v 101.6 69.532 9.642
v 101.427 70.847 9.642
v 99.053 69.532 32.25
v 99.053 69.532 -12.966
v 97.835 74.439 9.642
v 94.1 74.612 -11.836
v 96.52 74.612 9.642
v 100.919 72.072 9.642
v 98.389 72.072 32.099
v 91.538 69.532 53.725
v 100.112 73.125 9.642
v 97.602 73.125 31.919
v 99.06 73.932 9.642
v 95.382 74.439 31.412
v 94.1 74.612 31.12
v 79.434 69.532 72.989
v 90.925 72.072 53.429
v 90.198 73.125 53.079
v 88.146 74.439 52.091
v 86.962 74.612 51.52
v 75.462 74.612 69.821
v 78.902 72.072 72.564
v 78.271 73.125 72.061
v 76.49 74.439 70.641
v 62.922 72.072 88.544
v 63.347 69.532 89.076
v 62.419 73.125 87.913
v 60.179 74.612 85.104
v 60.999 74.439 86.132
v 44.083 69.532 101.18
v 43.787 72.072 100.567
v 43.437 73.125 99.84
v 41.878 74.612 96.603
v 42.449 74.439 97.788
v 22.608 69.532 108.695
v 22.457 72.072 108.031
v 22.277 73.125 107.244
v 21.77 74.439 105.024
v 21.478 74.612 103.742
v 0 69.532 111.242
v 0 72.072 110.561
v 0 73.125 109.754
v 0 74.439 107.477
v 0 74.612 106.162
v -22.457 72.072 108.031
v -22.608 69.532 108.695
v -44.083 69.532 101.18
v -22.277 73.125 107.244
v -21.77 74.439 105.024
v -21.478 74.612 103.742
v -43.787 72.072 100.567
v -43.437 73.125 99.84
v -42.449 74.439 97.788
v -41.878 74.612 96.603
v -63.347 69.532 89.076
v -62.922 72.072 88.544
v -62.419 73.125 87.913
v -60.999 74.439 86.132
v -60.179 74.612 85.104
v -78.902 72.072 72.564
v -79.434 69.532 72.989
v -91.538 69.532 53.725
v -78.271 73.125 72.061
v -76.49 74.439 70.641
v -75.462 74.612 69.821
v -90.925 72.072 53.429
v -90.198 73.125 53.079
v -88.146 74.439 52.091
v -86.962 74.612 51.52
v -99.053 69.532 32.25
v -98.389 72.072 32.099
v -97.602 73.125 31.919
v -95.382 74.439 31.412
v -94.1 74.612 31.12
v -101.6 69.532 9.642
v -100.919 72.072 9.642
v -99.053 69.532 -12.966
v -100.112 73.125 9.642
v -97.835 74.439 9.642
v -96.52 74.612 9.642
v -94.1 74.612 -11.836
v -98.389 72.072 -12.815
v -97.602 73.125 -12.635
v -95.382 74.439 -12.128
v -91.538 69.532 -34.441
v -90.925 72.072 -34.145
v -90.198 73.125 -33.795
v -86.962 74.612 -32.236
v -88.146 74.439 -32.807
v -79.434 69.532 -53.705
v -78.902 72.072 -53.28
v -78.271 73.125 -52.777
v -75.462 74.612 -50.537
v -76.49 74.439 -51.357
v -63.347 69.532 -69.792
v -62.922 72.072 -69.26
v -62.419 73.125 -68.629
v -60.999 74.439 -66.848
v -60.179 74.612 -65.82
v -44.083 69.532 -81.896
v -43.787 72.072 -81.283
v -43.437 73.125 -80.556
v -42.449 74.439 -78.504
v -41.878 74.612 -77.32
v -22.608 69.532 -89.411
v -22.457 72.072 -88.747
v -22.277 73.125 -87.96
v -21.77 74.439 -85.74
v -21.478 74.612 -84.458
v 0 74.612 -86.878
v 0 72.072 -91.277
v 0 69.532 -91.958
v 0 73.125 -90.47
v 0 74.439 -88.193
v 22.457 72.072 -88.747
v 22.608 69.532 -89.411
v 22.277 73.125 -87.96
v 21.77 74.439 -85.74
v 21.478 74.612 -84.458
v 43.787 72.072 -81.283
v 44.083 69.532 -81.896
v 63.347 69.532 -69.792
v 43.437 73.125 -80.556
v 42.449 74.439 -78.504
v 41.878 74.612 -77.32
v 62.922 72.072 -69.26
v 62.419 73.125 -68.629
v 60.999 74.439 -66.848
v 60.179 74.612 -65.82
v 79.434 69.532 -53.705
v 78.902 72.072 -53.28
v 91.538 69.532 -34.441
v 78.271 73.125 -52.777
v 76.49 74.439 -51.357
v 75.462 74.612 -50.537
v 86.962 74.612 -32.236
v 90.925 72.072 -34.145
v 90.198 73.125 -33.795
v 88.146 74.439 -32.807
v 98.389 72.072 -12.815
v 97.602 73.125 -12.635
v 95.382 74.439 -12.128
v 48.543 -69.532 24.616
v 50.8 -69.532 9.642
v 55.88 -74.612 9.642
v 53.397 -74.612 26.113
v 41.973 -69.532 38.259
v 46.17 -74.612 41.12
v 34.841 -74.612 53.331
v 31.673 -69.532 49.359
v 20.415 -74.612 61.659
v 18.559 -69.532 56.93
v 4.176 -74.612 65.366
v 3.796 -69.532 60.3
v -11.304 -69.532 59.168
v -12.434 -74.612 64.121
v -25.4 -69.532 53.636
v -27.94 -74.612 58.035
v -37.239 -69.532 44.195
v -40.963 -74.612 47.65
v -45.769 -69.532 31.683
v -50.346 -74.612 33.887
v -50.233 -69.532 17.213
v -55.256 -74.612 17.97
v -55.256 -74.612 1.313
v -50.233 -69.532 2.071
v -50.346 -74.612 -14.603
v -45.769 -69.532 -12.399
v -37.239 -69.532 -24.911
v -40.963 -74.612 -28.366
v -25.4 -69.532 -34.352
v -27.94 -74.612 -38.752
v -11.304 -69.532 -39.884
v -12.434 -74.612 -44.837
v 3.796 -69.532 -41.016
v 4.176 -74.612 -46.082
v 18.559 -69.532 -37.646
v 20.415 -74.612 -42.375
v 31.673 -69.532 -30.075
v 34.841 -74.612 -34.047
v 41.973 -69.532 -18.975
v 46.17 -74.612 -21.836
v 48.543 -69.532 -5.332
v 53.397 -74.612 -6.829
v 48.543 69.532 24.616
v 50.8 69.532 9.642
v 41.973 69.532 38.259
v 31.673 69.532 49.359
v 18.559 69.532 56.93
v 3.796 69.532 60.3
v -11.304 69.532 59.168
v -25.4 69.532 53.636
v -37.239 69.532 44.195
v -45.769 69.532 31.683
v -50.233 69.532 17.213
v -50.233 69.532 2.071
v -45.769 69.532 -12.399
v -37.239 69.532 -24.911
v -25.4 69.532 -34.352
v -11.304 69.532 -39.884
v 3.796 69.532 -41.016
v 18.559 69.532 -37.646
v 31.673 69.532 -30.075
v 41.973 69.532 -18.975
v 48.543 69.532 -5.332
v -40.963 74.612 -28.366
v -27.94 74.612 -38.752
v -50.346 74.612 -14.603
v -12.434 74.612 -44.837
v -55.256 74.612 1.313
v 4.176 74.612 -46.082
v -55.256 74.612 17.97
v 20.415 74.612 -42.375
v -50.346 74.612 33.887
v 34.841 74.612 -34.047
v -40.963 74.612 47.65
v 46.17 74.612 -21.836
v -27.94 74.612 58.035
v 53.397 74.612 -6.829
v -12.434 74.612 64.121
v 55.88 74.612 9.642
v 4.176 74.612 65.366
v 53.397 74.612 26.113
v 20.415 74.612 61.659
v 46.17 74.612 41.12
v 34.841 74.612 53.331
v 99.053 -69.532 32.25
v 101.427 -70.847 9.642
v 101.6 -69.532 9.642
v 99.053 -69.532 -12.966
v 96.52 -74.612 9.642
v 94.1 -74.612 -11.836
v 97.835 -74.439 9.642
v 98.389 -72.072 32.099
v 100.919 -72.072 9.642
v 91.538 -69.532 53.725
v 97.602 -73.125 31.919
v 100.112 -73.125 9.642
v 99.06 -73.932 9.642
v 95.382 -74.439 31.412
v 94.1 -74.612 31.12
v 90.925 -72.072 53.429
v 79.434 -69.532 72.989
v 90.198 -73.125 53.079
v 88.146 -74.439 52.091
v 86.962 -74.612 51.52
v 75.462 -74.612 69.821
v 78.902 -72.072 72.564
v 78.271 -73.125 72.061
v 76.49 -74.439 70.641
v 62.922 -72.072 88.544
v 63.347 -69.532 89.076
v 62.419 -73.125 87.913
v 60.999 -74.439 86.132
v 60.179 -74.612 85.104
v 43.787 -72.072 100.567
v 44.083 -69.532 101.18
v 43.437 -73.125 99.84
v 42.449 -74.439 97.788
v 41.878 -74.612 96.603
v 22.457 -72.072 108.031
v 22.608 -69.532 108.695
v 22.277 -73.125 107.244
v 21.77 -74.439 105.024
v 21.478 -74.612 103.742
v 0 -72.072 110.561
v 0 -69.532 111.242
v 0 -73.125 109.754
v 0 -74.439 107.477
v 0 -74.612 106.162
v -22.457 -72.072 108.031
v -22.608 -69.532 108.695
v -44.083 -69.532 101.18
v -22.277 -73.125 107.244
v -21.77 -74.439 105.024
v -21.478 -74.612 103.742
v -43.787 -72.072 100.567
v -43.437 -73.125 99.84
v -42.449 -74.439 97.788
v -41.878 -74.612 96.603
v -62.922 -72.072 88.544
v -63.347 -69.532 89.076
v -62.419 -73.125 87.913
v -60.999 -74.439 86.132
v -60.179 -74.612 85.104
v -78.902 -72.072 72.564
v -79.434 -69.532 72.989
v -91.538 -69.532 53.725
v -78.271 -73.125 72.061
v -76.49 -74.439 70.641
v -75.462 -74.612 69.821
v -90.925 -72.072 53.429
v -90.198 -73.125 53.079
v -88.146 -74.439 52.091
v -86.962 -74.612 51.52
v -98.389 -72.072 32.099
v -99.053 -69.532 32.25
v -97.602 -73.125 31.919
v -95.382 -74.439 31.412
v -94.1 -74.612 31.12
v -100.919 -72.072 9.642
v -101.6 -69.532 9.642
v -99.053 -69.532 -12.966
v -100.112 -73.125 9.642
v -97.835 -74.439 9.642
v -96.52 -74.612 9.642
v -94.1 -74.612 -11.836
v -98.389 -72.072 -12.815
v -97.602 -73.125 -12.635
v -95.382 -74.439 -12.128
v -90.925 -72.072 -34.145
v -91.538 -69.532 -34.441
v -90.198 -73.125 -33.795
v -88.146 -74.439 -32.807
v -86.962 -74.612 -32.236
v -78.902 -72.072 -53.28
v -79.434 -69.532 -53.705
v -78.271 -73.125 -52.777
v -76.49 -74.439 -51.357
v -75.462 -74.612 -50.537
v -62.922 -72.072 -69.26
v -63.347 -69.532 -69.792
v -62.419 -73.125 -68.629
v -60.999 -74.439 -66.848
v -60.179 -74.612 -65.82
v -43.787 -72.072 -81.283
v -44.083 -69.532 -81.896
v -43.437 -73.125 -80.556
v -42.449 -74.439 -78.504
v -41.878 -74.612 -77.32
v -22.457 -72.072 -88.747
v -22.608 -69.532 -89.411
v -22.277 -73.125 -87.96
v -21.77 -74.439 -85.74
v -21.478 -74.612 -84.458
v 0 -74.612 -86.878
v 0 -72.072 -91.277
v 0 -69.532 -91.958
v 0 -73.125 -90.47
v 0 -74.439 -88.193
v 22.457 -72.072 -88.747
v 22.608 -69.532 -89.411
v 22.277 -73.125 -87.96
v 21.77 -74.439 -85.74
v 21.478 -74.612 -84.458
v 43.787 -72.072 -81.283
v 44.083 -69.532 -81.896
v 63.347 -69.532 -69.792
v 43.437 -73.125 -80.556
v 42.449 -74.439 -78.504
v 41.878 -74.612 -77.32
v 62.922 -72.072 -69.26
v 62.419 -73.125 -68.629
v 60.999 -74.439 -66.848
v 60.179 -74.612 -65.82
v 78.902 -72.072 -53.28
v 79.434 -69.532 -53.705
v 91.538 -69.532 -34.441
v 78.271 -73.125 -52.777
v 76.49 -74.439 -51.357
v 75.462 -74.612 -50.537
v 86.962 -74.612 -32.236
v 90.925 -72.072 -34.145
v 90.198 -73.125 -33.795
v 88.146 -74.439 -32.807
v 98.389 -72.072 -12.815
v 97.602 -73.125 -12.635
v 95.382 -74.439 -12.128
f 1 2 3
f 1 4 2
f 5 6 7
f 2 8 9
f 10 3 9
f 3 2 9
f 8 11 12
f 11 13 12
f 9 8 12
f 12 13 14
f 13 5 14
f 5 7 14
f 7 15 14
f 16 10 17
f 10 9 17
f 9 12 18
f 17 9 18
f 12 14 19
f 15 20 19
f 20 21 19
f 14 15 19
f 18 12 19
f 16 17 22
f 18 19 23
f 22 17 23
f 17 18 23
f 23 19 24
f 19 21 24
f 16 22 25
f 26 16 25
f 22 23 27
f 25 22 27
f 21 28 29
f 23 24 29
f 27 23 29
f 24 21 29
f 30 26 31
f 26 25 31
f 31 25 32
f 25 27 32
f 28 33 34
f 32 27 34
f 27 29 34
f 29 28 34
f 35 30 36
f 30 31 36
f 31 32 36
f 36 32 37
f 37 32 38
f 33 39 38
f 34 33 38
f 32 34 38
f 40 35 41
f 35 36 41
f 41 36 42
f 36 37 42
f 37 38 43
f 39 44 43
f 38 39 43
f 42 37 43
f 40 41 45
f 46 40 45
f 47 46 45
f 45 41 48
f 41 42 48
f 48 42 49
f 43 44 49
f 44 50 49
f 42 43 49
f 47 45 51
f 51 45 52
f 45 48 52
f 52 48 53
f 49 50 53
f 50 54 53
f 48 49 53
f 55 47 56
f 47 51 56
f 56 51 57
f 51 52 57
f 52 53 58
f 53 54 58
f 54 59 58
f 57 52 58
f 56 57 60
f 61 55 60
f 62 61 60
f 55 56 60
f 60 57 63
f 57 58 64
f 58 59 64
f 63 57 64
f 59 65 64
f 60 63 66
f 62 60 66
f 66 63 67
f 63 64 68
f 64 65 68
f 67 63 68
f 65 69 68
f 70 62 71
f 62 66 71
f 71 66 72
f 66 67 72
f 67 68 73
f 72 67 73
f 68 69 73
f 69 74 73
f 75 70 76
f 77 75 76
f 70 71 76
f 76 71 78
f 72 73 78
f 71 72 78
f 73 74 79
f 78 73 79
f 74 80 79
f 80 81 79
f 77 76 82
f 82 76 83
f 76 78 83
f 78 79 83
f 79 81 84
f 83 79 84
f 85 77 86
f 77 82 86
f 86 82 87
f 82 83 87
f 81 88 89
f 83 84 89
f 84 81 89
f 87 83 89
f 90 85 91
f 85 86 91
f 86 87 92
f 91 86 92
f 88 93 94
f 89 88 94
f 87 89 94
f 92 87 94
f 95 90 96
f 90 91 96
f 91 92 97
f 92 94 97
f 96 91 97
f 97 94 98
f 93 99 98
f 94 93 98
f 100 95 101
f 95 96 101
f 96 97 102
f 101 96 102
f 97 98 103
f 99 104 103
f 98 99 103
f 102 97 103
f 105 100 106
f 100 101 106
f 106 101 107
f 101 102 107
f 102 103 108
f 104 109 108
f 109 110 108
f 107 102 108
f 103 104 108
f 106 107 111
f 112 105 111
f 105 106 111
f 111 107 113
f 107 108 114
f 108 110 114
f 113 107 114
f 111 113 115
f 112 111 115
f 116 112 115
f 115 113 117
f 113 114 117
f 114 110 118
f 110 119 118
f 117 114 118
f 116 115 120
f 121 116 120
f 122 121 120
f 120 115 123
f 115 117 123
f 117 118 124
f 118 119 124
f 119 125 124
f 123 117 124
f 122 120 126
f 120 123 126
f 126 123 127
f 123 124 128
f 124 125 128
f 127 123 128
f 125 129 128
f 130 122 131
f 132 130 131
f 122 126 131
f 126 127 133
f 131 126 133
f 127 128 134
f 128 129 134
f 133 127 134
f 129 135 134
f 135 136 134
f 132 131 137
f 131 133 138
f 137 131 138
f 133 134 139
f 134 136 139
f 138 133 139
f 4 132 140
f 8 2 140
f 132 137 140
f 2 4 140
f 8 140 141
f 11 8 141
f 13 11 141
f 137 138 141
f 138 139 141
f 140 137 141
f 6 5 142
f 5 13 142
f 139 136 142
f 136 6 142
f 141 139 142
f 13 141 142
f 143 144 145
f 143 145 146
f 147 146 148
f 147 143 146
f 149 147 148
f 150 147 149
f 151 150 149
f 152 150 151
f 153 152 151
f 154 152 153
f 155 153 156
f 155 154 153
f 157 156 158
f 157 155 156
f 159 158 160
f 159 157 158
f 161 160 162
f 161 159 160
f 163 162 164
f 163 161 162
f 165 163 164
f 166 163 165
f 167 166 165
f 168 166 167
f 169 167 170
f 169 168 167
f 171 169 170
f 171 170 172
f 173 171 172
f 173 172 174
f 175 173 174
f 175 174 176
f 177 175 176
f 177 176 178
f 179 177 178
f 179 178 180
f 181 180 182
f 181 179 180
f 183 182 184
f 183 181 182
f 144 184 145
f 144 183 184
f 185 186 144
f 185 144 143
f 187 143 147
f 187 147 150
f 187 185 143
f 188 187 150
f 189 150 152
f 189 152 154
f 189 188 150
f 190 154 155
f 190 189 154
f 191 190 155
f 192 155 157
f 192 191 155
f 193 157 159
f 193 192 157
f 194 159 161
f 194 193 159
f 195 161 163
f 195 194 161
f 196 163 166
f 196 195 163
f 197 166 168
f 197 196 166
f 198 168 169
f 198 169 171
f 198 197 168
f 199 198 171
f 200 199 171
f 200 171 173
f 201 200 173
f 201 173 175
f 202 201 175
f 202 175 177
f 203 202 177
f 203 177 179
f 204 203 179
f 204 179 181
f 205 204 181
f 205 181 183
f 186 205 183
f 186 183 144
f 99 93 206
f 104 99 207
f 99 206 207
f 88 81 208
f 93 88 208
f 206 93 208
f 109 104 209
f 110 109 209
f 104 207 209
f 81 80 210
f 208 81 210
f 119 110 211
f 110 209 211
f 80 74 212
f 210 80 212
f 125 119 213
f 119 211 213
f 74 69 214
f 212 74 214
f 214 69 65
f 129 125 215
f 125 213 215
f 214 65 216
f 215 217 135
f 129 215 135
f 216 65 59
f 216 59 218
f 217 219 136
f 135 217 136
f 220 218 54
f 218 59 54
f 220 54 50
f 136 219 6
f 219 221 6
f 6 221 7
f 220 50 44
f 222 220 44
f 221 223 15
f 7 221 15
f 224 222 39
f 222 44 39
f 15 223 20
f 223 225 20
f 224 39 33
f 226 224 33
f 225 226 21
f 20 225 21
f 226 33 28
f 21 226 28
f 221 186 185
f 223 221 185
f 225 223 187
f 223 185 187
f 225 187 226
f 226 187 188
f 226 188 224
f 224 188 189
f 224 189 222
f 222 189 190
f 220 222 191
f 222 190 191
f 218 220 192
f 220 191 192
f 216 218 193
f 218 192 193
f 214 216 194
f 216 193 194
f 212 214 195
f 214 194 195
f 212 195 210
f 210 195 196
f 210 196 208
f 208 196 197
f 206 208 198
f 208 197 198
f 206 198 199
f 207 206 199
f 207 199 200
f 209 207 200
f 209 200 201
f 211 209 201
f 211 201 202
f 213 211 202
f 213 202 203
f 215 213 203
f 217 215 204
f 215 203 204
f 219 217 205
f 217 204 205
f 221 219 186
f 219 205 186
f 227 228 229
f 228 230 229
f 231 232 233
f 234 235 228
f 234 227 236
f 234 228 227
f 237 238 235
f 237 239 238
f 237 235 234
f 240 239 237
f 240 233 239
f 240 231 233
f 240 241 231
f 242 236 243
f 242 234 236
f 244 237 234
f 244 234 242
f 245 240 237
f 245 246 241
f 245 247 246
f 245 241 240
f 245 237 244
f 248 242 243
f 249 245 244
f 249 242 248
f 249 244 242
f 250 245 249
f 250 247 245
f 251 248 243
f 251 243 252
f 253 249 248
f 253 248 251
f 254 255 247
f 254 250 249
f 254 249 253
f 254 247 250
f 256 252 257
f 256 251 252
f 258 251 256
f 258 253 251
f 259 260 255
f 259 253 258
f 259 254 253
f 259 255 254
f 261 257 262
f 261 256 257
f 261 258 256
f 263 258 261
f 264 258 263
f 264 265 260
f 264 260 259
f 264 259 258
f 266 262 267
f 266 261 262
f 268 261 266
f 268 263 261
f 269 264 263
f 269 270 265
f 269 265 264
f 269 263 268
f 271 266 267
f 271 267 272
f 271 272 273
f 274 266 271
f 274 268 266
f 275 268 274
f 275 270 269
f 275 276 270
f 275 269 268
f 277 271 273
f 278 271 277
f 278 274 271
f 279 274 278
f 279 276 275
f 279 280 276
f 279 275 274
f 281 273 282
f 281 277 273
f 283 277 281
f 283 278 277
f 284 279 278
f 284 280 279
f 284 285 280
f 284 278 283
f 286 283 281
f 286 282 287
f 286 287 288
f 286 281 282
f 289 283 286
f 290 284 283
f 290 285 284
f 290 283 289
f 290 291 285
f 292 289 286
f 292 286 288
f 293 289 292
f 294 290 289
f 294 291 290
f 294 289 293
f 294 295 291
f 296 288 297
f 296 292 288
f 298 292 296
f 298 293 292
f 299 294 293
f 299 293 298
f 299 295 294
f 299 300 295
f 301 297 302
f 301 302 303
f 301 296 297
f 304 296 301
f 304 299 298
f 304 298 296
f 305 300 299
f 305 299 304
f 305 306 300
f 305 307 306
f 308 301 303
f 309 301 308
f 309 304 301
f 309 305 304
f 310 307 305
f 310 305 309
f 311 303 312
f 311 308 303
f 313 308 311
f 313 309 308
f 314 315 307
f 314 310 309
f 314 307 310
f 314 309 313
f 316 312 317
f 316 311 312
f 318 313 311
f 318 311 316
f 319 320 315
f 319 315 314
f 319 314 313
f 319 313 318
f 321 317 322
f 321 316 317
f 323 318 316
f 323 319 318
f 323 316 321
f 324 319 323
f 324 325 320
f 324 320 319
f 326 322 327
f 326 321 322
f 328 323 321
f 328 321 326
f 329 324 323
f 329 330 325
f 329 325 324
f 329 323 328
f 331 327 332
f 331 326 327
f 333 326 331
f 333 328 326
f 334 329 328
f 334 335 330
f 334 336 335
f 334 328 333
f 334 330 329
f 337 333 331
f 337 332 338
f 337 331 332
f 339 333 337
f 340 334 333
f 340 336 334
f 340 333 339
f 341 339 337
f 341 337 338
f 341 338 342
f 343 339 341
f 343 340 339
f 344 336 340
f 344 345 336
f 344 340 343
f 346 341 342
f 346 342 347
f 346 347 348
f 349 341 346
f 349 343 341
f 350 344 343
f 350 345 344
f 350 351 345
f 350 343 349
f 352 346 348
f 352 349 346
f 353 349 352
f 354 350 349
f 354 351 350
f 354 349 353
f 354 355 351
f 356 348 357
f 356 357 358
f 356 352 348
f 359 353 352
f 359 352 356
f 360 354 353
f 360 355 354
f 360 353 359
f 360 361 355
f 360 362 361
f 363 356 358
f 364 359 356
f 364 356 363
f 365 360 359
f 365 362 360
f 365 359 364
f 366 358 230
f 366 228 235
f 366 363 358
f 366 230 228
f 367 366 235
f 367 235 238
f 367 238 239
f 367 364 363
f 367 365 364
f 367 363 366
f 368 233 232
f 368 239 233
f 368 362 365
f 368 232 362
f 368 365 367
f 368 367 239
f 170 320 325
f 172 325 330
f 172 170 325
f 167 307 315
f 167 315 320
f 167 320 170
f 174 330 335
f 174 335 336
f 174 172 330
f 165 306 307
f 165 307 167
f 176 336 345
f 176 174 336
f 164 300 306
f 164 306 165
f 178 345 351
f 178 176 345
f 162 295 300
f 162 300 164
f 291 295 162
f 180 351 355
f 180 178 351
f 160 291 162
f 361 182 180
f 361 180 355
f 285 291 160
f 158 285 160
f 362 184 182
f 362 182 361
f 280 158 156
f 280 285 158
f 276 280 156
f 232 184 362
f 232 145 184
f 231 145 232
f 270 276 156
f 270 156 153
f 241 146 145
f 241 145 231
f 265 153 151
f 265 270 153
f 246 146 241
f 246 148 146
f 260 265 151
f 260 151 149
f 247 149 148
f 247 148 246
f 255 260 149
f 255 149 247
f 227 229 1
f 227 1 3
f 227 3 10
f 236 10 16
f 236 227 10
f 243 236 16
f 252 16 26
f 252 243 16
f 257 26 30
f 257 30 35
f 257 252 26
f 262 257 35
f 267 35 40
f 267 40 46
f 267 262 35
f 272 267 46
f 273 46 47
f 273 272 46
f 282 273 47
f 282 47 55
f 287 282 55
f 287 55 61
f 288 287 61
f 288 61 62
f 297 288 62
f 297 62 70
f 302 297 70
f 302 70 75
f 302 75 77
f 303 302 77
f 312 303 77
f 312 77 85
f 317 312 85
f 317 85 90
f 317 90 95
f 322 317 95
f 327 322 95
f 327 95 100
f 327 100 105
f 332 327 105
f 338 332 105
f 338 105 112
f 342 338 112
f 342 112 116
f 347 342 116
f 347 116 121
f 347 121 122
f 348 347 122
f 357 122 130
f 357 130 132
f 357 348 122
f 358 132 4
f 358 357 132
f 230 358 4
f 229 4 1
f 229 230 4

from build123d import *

# Parameters (mm, degrees)
F0_R     = 101.6
F0_R_2   = 50.8
F1_DEPTH = 74.6125
F2_R     = 5.08
F3_SIZE  = 5.08


with BuildPart() as f1:
    # F0 (on Front) → F1 (new body, symmetric)
    with BuildSketch(Plane.XZ):
        with Locations((0, 9.641961284)):
            Circle(F0_R)
        with Locations((0, 9.641961284)):
            Circle(F0_R_2, mode=Mode.SUBTRACT)
    extrude(amount=F1_DEPTH, both=True)

    # F2
    f2_edges = [f1.edges().sort_by_distance(p)[0] for p in [
        (-101.6, 74.6125, 9.641961),
        (101.6, 0, 9.641961),
        (-101.6, -74.6125, 9.641961),
    ]]
    fillet(f2_edges, radius=F2_R)

    # F3
    f3_edges = [f1.edges().sort_by_distance(p)[0] for p in [
        (-50.8, -74.6125, 9.641961),
        (50.8, 0, 9.641961),
        (-50.8, 74.6125, 9.641961),
    ]]
    chamfer(f3_edges, length=F3_SIZE)


solid = f1.part
